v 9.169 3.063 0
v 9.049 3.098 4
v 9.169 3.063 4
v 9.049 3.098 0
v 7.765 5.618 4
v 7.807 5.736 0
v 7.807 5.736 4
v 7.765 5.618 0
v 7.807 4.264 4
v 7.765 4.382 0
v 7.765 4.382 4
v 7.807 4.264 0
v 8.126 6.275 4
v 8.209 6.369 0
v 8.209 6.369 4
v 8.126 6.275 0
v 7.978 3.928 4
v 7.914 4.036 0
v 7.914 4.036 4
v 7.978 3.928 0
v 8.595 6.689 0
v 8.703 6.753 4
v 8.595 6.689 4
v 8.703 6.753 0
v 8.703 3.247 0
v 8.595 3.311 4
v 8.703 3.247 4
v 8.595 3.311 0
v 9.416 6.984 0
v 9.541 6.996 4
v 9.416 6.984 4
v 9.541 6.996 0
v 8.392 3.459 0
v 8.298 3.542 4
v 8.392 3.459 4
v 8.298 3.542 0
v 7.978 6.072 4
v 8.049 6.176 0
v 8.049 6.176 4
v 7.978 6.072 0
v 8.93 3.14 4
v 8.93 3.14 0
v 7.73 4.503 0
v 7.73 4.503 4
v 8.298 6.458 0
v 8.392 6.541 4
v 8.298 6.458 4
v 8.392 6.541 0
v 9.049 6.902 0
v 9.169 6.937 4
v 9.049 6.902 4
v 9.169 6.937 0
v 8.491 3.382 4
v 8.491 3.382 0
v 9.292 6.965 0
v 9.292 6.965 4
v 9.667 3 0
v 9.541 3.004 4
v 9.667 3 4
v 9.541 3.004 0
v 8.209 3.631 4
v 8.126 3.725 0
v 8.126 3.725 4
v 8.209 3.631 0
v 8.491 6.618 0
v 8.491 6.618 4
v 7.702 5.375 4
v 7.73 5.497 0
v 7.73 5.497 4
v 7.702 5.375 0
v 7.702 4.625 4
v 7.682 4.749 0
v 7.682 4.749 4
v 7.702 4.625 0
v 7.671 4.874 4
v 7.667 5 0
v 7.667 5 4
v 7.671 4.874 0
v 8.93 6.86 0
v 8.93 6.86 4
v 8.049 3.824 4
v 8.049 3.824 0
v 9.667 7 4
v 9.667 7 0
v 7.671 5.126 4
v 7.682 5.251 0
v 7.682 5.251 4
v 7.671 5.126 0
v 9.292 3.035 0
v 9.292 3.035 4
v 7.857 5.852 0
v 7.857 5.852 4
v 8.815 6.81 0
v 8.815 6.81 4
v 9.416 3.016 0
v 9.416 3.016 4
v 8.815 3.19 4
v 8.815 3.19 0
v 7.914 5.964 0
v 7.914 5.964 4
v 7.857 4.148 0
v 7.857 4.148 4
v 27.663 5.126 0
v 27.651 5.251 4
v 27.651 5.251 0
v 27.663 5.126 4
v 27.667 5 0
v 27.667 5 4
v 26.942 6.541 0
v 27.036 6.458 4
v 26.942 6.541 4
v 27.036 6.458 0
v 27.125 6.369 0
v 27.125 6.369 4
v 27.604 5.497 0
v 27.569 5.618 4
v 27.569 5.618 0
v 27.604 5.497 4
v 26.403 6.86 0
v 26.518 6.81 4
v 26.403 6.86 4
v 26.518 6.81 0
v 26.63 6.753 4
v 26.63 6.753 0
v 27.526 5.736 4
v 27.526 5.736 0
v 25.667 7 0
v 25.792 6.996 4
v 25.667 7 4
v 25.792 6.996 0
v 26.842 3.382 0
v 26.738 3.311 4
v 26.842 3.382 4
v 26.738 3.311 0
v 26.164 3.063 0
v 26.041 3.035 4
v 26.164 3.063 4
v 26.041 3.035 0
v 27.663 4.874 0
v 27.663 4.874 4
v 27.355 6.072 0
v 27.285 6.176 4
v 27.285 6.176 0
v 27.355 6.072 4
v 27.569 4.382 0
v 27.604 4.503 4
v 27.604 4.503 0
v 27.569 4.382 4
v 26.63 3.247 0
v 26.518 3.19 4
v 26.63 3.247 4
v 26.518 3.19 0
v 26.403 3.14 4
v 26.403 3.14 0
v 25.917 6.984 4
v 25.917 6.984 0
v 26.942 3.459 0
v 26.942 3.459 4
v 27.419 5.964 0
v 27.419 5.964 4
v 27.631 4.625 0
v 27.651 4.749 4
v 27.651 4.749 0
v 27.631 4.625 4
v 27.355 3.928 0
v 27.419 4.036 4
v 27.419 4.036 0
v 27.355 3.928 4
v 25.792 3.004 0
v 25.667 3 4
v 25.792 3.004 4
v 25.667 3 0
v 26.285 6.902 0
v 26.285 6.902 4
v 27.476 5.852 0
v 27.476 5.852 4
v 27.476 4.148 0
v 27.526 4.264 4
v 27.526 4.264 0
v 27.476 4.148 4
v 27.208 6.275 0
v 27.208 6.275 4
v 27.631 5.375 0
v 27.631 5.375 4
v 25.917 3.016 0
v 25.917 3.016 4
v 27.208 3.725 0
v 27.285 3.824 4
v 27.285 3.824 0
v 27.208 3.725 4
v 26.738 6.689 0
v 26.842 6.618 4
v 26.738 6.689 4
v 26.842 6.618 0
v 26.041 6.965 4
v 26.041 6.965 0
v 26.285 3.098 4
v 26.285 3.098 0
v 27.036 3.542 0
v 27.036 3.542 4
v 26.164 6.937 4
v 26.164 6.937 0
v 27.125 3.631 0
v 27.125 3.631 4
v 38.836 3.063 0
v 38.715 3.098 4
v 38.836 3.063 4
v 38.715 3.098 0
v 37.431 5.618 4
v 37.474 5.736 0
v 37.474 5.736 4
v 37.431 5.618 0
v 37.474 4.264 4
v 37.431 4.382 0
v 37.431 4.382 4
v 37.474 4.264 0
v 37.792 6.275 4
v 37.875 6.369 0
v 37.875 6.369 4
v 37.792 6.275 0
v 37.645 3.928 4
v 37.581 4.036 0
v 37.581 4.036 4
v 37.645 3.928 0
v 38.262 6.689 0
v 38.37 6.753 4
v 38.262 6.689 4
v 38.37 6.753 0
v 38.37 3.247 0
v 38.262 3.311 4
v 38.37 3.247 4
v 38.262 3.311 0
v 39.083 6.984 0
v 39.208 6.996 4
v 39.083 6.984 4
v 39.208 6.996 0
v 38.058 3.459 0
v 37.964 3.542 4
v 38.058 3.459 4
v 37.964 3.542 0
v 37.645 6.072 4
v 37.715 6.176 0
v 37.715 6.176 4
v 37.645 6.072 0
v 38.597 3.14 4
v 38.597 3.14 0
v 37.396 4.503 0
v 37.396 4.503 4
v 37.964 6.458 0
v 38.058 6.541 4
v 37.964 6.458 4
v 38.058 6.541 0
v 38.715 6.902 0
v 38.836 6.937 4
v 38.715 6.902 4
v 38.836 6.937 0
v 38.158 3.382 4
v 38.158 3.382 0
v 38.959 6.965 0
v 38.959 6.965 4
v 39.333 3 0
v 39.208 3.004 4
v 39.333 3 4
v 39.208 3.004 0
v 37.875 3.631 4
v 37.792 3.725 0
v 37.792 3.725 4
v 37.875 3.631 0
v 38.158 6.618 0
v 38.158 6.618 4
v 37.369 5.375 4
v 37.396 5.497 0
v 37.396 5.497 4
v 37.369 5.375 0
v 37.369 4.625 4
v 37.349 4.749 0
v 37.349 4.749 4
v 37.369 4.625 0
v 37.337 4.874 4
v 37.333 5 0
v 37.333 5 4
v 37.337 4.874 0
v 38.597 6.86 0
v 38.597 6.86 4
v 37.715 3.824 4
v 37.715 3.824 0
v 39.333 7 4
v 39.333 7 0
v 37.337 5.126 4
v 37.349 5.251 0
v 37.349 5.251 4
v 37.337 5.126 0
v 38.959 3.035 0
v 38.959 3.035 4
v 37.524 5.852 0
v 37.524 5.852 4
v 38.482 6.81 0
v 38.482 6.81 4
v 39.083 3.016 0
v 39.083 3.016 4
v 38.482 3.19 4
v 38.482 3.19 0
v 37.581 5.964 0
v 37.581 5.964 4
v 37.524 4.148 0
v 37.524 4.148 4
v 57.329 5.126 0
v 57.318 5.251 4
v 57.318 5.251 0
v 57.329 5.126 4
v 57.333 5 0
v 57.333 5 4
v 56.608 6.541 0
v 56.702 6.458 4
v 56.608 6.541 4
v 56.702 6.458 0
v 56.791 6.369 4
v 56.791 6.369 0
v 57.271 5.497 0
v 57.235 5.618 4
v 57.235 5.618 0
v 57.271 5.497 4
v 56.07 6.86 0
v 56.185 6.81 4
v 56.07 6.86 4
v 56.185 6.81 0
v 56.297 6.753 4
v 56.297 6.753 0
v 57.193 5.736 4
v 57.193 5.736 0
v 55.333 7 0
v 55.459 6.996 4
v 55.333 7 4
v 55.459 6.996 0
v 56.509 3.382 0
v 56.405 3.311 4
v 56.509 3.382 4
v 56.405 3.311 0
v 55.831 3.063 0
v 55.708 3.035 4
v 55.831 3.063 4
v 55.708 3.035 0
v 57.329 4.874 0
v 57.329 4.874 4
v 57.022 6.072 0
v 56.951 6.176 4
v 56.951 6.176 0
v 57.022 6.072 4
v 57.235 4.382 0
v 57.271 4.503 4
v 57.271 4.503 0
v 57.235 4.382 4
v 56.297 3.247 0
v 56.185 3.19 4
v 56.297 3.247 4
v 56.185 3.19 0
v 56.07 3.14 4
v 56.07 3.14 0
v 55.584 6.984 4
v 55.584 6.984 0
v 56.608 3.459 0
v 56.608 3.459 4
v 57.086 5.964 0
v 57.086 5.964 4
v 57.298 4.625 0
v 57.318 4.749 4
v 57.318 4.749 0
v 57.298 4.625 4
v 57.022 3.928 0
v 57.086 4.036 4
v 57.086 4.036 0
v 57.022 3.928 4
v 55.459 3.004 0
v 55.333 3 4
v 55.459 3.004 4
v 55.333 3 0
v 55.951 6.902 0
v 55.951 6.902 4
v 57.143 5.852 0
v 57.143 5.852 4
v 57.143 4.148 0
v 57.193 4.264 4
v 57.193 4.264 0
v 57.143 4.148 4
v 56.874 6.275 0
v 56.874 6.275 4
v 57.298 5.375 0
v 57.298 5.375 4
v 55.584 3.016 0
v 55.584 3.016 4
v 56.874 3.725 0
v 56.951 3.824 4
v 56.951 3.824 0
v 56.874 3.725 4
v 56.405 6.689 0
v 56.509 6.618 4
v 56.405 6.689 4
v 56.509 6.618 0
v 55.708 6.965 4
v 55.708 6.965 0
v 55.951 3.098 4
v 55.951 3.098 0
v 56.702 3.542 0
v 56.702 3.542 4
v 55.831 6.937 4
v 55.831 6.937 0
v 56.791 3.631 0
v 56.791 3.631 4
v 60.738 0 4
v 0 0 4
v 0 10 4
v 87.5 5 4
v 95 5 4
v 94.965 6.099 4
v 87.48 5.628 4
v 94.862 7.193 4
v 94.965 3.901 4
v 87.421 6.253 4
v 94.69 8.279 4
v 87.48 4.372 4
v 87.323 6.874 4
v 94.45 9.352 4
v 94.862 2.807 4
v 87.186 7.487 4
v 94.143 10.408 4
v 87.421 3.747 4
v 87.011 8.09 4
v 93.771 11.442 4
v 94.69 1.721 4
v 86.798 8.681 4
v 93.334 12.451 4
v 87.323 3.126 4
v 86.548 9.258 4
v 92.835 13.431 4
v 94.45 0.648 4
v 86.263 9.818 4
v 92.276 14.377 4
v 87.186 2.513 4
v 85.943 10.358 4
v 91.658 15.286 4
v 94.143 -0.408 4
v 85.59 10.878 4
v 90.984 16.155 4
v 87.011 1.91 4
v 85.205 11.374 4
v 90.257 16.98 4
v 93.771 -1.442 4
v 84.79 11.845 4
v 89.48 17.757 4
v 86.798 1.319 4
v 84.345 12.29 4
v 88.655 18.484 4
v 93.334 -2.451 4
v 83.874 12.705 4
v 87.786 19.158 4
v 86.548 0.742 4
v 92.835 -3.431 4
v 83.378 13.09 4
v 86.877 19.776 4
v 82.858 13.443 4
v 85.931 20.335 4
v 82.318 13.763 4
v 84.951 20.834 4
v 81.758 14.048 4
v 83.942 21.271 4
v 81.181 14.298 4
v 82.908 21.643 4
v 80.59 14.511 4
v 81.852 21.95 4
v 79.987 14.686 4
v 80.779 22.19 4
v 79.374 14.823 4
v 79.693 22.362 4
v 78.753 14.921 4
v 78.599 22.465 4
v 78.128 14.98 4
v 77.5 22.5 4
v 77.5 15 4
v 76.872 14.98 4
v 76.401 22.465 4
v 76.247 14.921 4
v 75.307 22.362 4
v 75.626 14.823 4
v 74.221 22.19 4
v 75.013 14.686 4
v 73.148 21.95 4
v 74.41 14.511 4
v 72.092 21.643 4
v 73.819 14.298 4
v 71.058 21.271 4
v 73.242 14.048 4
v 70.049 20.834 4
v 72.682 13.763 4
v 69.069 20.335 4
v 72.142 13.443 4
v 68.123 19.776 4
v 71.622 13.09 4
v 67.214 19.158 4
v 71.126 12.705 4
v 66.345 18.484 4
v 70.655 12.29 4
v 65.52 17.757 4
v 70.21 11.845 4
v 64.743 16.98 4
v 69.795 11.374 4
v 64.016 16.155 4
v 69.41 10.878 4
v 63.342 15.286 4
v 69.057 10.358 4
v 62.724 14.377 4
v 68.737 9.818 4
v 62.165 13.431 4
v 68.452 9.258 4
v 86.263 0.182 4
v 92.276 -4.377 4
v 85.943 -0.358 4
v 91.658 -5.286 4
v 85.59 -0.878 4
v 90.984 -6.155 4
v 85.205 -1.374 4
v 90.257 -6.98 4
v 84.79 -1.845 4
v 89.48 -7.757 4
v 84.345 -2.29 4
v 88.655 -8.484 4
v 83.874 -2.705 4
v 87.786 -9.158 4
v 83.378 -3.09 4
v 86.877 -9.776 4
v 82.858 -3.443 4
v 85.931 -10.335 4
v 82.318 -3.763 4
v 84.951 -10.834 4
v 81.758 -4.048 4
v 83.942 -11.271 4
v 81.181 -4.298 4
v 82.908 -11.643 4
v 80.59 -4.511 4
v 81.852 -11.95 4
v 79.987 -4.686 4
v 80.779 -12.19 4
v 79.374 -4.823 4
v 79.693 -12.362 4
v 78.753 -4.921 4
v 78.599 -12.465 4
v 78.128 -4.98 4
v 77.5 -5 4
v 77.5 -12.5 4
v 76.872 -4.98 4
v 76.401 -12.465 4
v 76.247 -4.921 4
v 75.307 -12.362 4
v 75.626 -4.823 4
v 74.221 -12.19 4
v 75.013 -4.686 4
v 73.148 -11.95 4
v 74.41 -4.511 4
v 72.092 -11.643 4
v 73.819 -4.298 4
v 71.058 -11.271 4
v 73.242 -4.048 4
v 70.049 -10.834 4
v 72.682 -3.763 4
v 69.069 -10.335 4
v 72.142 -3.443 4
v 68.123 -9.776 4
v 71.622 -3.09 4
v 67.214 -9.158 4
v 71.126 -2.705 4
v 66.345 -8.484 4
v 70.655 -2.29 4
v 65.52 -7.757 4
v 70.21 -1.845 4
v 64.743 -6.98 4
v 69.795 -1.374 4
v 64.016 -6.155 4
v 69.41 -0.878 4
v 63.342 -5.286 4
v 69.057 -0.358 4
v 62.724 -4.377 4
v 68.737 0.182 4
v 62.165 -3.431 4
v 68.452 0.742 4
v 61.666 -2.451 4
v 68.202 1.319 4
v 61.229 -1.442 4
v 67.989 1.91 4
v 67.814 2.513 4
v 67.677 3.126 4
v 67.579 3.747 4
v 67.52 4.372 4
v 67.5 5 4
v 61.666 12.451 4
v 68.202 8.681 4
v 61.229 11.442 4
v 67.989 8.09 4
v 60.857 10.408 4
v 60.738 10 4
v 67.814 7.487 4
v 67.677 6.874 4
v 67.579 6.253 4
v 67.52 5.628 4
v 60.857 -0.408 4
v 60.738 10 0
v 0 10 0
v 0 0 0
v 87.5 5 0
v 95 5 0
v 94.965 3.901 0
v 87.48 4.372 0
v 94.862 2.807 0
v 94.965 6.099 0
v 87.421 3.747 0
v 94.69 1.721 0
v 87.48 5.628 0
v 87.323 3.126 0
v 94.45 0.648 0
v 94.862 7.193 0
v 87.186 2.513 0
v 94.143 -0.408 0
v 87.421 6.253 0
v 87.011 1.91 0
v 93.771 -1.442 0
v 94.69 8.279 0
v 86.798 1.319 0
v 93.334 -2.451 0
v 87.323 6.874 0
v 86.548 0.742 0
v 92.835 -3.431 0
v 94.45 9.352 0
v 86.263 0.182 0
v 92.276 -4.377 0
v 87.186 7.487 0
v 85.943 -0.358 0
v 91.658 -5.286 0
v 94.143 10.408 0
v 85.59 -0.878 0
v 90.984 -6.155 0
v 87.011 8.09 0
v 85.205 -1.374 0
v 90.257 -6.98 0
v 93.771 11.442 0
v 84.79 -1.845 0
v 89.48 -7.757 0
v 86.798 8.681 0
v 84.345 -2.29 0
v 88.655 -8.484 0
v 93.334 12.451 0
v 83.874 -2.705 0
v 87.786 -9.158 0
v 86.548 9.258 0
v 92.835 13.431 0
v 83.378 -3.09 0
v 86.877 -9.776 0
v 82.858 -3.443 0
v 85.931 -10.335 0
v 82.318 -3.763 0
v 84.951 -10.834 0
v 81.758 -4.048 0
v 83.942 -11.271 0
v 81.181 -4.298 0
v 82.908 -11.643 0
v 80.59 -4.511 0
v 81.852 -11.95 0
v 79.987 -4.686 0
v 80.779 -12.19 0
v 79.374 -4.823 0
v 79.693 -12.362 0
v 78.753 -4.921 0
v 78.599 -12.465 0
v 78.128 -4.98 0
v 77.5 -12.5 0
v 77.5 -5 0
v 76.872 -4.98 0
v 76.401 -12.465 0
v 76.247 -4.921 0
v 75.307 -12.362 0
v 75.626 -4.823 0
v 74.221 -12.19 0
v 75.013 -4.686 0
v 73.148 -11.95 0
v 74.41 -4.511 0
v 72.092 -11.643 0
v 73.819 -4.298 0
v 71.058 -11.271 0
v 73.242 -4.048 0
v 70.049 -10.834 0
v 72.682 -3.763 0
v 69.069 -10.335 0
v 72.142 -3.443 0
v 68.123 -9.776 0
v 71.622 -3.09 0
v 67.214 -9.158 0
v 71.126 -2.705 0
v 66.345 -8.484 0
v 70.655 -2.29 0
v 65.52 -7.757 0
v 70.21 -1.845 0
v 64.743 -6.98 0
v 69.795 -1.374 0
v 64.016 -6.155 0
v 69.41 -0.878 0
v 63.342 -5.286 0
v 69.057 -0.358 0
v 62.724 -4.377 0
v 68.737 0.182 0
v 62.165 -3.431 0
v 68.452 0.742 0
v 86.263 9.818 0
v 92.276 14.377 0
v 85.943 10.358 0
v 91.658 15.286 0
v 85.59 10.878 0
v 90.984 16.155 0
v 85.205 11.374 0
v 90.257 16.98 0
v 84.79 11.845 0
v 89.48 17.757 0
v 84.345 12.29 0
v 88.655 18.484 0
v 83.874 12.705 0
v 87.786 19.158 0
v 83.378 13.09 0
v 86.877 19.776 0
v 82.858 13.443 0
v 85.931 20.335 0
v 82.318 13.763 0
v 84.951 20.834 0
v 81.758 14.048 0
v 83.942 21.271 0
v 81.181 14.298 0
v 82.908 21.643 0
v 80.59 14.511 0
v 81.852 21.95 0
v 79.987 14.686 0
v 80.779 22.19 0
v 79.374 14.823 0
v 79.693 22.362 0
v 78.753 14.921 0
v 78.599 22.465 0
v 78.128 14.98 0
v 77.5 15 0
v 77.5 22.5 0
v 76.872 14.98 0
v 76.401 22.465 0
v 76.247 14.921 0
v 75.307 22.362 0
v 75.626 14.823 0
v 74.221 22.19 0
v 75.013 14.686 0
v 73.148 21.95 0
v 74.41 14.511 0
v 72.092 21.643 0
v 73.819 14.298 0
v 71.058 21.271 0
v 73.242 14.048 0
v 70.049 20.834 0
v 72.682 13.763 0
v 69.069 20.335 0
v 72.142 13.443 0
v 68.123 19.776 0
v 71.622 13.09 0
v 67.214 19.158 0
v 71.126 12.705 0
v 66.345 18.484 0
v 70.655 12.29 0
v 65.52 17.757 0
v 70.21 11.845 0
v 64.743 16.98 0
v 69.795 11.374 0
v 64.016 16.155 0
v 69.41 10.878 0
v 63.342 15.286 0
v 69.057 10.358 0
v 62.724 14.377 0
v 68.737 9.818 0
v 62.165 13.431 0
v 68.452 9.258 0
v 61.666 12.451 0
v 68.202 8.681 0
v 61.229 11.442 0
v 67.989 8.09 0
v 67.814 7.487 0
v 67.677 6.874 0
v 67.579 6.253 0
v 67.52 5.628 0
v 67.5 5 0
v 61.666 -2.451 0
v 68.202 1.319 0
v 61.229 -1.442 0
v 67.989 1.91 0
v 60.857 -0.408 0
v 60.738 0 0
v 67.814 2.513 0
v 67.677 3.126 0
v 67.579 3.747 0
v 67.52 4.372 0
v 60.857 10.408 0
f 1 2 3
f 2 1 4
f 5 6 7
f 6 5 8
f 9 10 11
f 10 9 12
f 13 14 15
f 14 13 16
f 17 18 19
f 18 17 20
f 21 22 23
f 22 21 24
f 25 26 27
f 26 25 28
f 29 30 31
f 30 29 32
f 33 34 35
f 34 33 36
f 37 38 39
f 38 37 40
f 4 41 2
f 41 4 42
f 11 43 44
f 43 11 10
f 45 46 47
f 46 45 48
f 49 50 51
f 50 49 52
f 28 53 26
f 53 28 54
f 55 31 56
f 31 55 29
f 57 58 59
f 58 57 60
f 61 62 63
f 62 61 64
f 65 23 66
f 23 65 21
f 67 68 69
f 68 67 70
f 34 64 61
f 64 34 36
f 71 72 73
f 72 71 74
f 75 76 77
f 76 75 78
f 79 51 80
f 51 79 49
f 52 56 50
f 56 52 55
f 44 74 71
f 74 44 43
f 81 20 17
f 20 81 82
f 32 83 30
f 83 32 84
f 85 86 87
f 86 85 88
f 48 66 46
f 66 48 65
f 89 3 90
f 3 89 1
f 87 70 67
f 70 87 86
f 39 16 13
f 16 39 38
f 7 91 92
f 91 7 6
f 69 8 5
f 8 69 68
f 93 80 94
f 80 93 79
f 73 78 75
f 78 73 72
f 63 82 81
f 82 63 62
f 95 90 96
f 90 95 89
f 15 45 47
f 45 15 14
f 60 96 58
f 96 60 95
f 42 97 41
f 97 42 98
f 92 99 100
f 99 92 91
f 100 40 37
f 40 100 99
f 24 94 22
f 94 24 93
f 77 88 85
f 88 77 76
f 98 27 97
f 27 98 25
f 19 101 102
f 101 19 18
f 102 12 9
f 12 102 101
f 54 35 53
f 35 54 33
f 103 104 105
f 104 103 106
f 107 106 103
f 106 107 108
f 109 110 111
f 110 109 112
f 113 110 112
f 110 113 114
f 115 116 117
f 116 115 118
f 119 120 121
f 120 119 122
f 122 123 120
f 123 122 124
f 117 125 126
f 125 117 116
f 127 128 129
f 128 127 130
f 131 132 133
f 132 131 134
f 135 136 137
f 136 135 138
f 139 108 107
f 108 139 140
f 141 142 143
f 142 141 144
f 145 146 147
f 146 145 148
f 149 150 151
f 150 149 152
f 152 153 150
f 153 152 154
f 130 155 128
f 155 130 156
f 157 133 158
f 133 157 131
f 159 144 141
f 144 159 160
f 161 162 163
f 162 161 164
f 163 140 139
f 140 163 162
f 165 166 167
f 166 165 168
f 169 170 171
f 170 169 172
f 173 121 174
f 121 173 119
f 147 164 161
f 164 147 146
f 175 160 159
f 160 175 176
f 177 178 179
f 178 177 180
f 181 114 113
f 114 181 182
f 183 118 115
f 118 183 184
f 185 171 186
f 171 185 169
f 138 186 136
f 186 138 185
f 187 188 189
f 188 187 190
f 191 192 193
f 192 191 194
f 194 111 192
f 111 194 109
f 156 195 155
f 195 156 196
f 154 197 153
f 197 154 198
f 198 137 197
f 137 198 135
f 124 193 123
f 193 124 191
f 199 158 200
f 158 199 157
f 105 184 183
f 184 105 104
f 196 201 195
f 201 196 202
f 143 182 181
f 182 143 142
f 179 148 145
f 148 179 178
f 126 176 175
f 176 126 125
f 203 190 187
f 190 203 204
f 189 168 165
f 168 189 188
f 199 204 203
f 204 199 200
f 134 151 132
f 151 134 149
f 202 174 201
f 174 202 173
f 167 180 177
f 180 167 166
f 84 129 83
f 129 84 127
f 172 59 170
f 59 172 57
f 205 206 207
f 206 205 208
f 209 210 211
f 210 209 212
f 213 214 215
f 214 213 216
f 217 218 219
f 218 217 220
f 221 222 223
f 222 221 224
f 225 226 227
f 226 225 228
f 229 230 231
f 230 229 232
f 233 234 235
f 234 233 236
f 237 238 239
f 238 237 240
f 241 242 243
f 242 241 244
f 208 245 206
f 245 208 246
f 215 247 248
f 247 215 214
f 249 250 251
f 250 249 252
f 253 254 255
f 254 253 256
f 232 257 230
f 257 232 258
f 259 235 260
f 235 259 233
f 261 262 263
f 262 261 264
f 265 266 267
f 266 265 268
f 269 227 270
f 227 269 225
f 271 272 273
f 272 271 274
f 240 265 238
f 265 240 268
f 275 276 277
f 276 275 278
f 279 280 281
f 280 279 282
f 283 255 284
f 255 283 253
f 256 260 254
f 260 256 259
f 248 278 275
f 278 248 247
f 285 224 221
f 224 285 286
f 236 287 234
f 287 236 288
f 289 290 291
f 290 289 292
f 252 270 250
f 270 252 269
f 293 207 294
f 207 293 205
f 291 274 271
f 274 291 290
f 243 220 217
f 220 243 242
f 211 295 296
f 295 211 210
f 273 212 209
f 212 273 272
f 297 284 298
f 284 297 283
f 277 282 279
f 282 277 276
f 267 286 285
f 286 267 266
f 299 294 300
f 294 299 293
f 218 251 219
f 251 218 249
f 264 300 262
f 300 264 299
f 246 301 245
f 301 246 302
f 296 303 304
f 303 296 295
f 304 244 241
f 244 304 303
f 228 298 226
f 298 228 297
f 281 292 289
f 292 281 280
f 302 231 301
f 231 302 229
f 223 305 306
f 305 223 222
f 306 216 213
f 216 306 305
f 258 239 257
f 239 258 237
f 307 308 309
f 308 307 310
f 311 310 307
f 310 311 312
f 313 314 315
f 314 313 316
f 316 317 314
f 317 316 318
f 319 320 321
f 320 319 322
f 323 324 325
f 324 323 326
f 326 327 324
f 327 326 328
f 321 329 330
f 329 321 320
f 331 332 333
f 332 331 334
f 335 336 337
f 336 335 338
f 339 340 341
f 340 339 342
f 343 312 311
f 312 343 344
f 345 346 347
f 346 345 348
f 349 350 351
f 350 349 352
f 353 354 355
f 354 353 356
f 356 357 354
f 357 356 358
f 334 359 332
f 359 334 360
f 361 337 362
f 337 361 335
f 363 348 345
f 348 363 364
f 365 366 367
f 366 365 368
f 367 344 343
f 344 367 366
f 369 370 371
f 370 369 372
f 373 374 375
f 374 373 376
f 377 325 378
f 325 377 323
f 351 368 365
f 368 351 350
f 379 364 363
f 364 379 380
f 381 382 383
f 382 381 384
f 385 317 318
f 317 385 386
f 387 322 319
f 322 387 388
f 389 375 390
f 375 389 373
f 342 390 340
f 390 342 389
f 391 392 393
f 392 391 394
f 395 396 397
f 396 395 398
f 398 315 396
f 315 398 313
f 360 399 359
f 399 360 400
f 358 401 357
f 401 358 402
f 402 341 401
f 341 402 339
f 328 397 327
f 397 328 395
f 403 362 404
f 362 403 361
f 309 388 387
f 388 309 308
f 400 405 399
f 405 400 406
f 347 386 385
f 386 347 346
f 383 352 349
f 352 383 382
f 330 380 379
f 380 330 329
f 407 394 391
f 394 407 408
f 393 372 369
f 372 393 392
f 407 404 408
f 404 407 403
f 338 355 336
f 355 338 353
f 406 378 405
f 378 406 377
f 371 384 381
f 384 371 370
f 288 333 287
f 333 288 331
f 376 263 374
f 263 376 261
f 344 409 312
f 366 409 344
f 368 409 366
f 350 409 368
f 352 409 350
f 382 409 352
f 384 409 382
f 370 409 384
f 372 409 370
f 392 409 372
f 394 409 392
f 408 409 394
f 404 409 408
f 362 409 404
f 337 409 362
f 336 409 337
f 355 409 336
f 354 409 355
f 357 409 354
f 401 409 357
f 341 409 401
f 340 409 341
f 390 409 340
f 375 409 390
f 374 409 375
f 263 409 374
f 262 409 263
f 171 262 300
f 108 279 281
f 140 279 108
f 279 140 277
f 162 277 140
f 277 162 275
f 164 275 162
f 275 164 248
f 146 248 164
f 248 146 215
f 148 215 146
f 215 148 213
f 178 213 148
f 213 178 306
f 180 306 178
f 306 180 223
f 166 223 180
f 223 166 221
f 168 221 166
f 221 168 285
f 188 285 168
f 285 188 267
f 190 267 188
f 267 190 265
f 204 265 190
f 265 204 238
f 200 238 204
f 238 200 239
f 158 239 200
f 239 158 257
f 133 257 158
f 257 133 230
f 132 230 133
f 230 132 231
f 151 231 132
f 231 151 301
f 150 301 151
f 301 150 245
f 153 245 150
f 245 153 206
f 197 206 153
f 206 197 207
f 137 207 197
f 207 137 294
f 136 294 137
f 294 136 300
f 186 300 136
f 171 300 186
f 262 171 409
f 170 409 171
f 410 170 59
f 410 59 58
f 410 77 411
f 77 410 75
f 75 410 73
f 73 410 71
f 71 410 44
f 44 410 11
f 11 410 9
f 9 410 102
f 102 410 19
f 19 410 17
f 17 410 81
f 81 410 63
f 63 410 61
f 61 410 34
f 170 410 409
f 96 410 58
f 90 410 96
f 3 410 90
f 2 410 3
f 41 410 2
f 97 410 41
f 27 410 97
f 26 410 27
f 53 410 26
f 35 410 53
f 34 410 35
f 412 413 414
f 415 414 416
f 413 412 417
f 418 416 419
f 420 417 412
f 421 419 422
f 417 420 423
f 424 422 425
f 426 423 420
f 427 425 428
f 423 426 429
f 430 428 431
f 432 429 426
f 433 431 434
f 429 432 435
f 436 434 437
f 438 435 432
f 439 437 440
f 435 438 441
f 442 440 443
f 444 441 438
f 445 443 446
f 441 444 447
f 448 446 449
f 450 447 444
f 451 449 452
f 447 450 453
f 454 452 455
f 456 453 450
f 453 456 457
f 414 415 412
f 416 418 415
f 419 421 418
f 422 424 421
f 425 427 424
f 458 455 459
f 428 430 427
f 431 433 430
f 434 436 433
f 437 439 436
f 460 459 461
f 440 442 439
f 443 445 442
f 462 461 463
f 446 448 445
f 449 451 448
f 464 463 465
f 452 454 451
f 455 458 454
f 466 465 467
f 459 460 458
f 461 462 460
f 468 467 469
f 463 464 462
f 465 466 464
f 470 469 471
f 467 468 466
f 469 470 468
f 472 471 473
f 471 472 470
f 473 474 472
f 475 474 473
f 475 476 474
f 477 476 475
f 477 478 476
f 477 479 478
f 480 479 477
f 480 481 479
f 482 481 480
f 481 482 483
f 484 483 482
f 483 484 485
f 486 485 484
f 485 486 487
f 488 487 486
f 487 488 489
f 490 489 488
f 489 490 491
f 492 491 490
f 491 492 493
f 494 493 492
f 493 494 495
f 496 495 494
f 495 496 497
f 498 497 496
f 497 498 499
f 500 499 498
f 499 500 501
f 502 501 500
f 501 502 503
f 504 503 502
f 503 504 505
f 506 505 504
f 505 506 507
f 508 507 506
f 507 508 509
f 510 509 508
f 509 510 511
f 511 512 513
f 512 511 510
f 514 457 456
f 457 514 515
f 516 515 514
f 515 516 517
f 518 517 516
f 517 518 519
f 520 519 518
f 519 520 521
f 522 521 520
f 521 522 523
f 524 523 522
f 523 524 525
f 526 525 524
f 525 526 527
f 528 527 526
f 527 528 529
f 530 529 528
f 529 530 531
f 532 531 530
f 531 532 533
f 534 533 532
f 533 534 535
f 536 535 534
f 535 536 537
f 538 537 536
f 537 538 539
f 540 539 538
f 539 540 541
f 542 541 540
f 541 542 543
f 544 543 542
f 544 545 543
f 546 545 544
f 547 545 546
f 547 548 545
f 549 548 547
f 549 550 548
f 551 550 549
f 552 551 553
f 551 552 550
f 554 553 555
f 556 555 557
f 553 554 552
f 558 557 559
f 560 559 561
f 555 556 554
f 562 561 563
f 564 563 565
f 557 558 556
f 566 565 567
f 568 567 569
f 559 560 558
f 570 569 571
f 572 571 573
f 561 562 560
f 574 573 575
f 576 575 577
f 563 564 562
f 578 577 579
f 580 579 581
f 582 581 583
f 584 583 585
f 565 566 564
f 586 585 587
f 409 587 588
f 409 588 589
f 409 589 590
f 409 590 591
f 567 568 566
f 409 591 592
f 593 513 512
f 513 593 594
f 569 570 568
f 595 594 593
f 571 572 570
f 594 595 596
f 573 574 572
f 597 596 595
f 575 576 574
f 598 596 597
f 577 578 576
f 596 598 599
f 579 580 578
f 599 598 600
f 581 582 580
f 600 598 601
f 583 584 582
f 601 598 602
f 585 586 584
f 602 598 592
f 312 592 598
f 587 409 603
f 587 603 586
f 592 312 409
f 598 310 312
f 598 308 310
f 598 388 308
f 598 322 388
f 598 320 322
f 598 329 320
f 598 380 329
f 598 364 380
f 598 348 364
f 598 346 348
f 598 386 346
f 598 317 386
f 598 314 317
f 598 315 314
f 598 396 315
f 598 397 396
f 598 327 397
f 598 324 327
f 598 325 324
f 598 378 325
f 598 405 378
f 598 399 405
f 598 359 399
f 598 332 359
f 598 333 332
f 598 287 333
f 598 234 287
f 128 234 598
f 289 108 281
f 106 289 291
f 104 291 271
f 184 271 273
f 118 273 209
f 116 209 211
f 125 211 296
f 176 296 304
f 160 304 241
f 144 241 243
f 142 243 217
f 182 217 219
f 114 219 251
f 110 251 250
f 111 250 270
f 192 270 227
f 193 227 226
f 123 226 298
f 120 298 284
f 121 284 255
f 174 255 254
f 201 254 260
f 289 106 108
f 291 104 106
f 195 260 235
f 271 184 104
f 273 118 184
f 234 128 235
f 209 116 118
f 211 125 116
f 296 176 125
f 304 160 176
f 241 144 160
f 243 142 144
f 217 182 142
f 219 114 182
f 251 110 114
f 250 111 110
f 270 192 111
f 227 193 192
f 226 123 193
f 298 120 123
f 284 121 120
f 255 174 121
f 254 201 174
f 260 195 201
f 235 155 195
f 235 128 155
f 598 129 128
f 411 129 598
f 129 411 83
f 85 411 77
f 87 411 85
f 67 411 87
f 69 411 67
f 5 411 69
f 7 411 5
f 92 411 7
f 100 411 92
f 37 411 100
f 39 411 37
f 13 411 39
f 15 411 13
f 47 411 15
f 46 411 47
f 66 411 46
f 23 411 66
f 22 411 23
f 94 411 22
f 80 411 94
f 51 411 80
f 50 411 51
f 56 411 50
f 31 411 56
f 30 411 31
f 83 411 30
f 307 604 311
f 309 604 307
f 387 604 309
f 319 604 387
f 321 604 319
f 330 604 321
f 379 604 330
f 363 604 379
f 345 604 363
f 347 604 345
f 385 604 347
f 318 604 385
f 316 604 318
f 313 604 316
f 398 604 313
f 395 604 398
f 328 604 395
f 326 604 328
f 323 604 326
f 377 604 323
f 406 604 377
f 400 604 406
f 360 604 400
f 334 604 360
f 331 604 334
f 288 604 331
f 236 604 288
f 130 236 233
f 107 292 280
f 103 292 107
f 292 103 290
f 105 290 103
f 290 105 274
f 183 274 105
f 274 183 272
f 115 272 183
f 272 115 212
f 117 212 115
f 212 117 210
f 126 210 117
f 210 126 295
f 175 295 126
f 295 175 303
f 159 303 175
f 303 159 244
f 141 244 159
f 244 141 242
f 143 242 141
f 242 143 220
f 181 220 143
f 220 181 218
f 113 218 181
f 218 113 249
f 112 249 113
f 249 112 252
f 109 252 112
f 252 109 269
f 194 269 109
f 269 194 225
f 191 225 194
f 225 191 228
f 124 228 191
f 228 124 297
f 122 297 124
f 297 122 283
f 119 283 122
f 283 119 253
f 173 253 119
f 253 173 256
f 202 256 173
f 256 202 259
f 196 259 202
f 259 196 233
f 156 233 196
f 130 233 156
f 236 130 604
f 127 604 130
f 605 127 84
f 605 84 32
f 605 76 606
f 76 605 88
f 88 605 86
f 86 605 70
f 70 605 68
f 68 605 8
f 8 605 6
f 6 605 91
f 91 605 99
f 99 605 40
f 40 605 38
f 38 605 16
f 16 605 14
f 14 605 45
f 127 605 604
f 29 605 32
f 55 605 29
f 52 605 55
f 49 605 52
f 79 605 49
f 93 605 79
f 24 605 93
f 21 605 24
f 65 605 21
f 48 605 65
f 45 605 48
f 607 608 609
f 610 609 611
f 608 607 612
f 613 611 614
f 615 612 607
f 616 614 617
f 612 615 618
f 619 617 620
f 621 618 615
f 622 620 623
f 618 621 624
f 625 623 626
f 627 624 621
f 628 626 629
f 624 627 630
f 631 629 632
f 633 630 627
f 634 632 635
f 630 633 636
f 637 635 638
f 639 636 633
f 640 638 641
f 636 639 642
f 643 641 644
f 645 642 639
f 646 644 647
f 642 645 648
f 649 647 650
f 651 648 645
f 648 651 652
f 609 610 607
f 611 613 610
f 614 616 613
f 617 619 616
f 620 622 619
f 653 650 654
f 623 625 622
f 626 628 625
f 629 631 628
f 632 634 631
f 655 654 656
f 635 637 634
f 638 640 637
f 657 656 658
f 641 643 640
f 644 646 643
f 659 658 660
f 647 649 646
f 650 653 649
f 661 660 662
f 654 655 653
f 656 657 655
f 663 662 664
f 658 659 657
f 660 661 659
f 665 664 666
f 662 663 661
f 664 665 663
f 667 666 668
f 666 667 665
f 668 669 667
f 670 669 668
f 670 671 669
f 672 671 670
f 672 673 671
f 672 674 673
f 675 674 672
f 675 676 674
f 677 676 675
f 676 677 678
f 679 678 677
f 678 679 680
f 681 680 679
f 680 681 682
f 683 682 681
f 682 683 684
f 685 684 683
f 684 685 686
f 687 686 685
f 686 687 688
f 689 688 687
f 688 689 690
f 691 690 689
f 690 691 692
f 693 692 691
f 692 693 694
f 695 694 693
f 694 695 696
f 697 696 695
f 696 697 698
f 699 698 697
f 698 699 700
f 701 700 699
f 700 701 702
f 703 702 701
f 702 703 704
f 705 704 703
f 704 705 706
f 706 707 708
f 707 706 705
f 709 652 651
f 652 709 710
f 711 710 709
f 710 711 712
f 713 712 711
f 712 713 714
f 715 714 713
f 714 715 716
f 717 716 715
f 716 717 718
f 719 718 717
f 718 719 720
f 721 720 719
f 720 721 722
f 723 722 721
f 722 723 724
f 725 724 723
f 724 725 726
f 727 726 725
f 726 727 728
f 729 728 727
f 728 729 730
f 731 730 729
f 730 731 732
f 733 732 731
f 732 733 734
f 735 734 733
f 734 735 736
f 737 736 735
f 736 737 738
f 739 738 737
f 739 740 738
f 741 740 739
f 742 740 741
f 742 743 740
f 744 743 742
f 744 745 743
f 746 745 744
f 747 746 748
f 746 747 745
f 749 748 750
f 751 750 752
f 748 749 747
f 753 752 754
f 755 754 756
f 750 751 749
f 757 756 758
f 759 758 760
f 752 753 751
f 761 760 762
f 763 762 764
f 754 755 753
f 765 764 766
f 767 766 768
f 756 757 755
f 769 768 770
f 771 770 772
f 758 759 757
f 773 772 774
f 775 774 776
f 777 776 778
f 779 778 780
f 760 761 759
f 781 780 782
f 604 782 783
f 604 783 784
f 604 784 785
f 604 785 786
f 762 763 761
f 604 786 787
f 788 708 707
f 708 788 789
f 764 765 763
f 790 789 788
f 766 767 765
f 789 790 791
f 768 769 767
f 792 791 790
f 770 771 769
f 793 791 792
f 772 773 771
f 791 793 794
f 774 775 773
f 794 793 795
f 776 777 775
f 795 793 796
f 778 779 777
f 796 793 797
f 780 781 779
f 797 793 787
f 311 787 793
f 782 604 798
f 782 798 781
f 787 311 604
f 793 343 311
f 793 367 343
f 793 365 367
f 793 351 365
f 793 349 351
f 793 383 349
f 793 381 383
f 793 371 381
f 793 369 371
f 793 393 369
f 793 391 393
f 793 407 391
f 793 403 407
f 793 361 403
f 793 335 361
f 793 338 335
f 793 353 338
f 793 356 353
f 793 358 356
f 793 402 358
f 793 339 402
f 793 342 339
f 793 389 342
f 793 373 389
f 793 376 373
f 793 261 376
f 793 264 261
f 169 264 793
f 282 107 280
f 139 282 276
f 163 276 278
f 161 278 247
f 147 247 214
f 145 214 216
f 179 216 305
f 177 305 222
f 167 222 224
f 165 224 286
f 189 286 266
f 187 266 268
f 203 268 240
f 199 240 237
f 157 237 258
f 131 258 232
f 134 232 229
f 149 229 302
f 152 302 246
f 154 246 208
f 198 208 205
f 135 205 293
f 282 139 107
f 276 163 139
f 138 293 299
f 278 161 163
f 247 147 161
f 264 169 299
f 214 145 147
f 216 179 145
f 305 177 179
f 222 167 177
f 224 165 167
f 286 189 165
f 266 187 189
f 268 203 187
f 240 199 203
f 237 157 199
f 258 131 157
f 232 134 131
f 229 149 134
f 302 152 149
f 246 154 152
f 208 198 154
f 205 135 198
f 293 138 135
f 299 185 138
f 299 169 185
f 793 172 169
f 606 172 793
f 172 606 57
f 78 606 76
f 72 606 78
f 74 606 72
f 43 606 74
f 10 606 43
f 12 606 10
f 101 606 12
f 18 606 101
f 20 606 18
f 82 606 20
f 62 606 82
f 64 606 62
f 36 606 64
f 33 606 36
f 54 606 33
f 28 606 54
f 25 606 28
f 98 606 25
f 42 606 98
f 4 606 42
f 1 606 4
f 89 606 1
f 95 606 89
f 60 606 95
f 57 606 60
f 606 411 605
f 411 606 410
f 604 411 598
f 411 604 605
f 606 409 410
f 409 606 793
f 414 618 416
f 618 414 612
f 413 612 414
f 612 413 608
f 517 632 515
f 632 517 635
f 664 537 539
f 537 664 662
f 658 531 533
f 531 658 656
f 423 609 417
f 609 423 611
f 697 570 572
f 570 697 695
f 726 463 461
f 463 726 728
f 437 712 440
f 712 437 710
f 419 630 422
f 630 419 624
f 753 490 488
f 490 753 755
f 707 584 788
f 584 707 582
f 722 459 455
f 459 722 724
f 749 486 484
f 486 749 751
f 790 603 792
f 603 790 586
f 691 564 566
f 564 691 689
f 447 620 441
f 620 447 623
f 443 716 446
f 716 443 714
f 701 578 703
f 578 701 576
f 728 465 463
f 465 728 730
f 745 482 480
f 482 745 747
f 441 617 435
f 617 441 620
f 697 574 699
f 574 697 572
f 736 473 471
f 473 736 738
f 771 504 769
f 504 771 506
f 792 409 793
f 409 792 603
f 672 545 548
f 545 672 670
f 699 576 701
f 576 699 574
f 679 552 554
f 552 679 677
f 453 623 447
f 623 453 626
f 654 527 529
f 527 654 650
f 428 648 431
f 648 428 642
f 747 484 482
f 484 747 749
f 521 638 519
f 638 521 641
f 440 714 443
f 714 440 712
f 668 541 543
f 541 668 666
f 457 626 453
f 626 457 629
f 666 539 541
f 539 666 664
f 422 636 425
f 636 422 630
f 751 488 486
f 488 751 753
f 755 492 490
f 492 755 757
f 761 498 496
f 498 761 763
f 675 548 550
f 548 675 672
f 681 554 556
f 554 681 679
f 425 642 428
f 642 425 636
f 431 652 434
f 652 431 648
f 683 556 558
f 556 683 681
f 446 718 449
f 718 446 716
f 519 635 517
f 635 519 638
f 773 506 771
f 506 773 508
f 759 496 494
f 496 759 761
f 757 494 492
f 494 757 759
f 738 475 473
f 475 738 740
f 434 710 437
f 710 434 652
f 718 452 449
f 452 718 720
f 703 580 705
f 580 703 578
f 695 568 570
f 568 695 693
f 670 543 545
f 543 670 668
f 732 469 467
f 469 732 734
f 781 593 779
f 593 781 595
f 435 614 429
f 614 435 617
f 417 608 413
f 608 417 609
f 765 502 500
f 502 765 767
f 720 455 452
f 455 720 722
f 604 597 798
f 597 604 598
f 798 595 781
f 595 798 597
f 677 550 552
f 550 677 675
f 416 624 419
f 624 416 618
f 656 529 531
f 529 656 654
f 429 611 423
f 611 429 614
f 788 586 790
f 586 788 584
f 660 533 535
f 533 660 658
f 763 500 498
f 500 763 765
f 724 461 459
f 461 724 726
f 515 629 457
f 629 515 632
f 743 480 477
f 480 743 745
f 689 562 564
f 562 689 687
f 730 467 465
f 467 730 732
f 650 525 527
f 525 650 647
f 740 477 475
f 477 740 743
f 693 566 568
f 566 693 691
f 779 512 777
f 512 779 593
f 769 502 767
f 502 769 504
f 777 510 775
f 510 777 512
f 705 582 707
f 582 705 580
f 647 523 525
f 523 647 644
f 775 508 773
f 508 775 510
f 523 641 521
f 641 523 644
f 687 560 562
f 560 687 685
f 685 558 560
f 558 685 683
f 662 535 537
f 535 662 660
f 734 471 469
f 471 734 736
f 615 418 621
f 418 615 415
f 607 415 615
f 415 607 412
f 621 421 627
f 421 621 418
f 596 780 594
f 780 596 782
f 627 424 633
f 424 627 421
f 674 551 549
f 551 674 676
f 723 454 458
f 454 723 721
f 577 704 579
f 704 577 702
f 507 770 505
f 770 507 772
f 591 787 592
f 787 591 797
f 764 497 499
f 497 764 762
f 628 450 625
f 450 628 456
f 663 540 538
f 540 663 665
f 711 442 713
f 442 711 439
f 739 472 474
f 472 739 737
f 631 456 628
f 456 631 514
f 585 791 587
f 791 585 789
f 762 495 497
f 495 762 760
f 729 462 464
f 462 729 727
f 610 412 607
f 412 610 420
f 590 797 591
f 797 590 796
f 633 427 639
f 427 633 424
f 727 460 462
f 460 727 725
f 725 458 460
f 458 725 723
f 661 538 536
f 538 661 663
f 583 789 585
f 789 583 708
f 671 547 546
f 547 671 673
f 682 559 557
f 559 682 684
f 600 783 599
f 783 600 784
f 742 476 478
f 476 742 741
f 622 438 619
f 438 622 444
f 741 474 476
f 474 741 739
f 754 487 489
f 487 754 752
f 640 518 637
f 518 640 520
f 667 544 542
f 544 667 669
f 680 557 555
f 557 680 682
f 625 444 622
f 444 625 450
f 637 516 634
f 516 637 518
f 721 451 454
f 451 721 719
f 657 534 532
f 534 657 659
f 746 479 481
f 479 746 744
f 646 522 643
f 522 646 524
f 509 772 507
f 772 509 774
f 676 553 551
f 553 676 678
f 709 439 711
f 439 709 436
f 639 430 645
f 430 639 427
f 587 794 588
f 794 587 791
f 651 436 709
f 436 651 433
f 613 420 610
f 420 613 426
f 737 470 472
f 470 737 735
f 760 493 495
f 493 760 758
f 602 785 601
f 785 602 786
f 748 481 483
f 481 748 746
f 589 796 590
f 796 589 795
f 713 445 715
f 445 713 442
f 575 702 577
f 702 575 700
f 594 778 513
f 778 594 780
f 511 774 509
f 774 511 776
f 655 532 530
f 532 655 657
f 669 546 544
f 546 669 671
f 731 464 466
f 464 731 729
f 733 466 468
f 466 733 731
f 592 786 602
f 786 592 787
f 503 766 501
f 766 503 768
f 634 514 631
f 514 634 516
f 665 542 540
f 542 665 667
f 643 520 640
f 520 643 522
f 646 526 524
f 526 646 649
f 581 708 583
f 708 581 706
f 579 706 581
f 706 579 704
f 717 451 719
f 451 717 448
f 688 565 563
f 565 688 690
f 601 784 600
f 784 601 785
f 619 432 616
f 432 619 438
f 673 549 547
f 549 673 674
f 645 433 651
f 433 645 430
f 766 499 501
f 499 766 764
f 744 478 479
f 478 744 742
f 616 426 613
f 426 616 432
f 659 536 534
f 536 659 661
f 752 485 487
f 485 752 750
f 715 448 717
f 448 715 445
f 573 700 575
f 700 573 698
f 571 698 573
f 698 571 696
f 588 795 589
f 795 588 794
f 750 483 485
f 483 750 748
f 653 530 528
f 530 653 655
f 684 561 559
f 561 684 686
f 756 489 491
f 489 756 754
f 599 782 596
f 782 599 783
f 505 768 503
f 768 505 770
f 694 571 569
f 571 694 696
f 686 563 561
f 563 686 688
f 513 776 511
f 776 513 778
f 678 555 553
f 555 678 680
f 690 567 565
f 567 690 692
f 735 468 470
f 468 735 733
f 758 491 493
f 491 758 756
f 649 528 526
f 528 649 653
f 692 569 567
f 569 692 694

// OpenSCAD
adapter_fanmount_length=65; //Overall length of the piece that attaches to the Wanhao i3 (or clone) fan mount.
adapter_fanmount_width=10;  //Width of fan mount
adapter_fanmount_depth=4;  //Thickness of the fan mount
adapter_fanmount_hole_length=20;  //Length of the two holes for the fan mount.  Making it longer allows for adjustability.
adapter_fanmount_hole_width=4;  //Width of the fan mount holes.
probe_mount_diameter_inner=20; //Probe diameter + 1-2mm
probe_mount_diameter_outer=35; //Outside dimeter of the piece the probe mounts to.
probe_depth=4;  //Thickness of the probe mount.
adapter_probe_overlap=5; //The overlap between the fan mount side and the probe mount side.
adapter_probe_offset=0; //The vertical offset between the fan mount and probe mount.  Allows for the probe to mount higher or lower than the fan mount.
$fn=100;

adapter();

module adapter() {
union() {
    fanmount();
    translate([adapter_fanmount_length+probe_mount_diameter_outer/2-adapter_probe_overlap,adapter_fanmount_width/2,adapter_probe_offset])
    probemount();
    translate([adapter_fanmount_length-adapter_probe_overlap,0,0])
    cube([adapter_probe_overlap,adapter_fanmount_width,adapter_fanmount_depth+adapter_probe_offset]);
}
}

module probemount() {
difference() {
cylinder(d=probe_mount_diameter_outer,h=probe_depth);
translate([0,0,-0.1])
cylinder(d=probe_mount_diameter_inner,h=probe_depth+0.2);
}
}

module fanmount() {
difference() {
cube([adapter_fanmount_length,adapter_fanmount_width,adapter_fanmount_depth]);
translate([adapter_fanmount_length/3-adapter_fanmount_hole_width,adapter_fanmount_width/2,-0.1])
fanmount_holes();
translate([adapter_fanmount_length*2/3+adapter_fanmount_hole_width,adapter_fanmount_width/2,-0.1])
fanmount_holes();
}
}

module fanmount_holes() {
translate([-(adapter_fanmount_hole_length-adapter_fanmount_hole_width)/2,0,0]) {
cylinder(d=adapter_fanmount_hole_width,h=adapter_fanmount_depth+0.2);
translate([adapter_fanmount_hole_length-adapter_fanmount_hole_width,0,0])
cylinder(d=adapter_fanmount_hole_width,h=adapter_fanmount_depth+0.2);
translate([0,-adapter_fanmount_hole_width/2,0])
cube([adapter_fanmount_hole_length-adapter_fanmount_hole_width,adapter_fanmount_hole_width,adapter_fanmount_depth+0.2]);
}
}
